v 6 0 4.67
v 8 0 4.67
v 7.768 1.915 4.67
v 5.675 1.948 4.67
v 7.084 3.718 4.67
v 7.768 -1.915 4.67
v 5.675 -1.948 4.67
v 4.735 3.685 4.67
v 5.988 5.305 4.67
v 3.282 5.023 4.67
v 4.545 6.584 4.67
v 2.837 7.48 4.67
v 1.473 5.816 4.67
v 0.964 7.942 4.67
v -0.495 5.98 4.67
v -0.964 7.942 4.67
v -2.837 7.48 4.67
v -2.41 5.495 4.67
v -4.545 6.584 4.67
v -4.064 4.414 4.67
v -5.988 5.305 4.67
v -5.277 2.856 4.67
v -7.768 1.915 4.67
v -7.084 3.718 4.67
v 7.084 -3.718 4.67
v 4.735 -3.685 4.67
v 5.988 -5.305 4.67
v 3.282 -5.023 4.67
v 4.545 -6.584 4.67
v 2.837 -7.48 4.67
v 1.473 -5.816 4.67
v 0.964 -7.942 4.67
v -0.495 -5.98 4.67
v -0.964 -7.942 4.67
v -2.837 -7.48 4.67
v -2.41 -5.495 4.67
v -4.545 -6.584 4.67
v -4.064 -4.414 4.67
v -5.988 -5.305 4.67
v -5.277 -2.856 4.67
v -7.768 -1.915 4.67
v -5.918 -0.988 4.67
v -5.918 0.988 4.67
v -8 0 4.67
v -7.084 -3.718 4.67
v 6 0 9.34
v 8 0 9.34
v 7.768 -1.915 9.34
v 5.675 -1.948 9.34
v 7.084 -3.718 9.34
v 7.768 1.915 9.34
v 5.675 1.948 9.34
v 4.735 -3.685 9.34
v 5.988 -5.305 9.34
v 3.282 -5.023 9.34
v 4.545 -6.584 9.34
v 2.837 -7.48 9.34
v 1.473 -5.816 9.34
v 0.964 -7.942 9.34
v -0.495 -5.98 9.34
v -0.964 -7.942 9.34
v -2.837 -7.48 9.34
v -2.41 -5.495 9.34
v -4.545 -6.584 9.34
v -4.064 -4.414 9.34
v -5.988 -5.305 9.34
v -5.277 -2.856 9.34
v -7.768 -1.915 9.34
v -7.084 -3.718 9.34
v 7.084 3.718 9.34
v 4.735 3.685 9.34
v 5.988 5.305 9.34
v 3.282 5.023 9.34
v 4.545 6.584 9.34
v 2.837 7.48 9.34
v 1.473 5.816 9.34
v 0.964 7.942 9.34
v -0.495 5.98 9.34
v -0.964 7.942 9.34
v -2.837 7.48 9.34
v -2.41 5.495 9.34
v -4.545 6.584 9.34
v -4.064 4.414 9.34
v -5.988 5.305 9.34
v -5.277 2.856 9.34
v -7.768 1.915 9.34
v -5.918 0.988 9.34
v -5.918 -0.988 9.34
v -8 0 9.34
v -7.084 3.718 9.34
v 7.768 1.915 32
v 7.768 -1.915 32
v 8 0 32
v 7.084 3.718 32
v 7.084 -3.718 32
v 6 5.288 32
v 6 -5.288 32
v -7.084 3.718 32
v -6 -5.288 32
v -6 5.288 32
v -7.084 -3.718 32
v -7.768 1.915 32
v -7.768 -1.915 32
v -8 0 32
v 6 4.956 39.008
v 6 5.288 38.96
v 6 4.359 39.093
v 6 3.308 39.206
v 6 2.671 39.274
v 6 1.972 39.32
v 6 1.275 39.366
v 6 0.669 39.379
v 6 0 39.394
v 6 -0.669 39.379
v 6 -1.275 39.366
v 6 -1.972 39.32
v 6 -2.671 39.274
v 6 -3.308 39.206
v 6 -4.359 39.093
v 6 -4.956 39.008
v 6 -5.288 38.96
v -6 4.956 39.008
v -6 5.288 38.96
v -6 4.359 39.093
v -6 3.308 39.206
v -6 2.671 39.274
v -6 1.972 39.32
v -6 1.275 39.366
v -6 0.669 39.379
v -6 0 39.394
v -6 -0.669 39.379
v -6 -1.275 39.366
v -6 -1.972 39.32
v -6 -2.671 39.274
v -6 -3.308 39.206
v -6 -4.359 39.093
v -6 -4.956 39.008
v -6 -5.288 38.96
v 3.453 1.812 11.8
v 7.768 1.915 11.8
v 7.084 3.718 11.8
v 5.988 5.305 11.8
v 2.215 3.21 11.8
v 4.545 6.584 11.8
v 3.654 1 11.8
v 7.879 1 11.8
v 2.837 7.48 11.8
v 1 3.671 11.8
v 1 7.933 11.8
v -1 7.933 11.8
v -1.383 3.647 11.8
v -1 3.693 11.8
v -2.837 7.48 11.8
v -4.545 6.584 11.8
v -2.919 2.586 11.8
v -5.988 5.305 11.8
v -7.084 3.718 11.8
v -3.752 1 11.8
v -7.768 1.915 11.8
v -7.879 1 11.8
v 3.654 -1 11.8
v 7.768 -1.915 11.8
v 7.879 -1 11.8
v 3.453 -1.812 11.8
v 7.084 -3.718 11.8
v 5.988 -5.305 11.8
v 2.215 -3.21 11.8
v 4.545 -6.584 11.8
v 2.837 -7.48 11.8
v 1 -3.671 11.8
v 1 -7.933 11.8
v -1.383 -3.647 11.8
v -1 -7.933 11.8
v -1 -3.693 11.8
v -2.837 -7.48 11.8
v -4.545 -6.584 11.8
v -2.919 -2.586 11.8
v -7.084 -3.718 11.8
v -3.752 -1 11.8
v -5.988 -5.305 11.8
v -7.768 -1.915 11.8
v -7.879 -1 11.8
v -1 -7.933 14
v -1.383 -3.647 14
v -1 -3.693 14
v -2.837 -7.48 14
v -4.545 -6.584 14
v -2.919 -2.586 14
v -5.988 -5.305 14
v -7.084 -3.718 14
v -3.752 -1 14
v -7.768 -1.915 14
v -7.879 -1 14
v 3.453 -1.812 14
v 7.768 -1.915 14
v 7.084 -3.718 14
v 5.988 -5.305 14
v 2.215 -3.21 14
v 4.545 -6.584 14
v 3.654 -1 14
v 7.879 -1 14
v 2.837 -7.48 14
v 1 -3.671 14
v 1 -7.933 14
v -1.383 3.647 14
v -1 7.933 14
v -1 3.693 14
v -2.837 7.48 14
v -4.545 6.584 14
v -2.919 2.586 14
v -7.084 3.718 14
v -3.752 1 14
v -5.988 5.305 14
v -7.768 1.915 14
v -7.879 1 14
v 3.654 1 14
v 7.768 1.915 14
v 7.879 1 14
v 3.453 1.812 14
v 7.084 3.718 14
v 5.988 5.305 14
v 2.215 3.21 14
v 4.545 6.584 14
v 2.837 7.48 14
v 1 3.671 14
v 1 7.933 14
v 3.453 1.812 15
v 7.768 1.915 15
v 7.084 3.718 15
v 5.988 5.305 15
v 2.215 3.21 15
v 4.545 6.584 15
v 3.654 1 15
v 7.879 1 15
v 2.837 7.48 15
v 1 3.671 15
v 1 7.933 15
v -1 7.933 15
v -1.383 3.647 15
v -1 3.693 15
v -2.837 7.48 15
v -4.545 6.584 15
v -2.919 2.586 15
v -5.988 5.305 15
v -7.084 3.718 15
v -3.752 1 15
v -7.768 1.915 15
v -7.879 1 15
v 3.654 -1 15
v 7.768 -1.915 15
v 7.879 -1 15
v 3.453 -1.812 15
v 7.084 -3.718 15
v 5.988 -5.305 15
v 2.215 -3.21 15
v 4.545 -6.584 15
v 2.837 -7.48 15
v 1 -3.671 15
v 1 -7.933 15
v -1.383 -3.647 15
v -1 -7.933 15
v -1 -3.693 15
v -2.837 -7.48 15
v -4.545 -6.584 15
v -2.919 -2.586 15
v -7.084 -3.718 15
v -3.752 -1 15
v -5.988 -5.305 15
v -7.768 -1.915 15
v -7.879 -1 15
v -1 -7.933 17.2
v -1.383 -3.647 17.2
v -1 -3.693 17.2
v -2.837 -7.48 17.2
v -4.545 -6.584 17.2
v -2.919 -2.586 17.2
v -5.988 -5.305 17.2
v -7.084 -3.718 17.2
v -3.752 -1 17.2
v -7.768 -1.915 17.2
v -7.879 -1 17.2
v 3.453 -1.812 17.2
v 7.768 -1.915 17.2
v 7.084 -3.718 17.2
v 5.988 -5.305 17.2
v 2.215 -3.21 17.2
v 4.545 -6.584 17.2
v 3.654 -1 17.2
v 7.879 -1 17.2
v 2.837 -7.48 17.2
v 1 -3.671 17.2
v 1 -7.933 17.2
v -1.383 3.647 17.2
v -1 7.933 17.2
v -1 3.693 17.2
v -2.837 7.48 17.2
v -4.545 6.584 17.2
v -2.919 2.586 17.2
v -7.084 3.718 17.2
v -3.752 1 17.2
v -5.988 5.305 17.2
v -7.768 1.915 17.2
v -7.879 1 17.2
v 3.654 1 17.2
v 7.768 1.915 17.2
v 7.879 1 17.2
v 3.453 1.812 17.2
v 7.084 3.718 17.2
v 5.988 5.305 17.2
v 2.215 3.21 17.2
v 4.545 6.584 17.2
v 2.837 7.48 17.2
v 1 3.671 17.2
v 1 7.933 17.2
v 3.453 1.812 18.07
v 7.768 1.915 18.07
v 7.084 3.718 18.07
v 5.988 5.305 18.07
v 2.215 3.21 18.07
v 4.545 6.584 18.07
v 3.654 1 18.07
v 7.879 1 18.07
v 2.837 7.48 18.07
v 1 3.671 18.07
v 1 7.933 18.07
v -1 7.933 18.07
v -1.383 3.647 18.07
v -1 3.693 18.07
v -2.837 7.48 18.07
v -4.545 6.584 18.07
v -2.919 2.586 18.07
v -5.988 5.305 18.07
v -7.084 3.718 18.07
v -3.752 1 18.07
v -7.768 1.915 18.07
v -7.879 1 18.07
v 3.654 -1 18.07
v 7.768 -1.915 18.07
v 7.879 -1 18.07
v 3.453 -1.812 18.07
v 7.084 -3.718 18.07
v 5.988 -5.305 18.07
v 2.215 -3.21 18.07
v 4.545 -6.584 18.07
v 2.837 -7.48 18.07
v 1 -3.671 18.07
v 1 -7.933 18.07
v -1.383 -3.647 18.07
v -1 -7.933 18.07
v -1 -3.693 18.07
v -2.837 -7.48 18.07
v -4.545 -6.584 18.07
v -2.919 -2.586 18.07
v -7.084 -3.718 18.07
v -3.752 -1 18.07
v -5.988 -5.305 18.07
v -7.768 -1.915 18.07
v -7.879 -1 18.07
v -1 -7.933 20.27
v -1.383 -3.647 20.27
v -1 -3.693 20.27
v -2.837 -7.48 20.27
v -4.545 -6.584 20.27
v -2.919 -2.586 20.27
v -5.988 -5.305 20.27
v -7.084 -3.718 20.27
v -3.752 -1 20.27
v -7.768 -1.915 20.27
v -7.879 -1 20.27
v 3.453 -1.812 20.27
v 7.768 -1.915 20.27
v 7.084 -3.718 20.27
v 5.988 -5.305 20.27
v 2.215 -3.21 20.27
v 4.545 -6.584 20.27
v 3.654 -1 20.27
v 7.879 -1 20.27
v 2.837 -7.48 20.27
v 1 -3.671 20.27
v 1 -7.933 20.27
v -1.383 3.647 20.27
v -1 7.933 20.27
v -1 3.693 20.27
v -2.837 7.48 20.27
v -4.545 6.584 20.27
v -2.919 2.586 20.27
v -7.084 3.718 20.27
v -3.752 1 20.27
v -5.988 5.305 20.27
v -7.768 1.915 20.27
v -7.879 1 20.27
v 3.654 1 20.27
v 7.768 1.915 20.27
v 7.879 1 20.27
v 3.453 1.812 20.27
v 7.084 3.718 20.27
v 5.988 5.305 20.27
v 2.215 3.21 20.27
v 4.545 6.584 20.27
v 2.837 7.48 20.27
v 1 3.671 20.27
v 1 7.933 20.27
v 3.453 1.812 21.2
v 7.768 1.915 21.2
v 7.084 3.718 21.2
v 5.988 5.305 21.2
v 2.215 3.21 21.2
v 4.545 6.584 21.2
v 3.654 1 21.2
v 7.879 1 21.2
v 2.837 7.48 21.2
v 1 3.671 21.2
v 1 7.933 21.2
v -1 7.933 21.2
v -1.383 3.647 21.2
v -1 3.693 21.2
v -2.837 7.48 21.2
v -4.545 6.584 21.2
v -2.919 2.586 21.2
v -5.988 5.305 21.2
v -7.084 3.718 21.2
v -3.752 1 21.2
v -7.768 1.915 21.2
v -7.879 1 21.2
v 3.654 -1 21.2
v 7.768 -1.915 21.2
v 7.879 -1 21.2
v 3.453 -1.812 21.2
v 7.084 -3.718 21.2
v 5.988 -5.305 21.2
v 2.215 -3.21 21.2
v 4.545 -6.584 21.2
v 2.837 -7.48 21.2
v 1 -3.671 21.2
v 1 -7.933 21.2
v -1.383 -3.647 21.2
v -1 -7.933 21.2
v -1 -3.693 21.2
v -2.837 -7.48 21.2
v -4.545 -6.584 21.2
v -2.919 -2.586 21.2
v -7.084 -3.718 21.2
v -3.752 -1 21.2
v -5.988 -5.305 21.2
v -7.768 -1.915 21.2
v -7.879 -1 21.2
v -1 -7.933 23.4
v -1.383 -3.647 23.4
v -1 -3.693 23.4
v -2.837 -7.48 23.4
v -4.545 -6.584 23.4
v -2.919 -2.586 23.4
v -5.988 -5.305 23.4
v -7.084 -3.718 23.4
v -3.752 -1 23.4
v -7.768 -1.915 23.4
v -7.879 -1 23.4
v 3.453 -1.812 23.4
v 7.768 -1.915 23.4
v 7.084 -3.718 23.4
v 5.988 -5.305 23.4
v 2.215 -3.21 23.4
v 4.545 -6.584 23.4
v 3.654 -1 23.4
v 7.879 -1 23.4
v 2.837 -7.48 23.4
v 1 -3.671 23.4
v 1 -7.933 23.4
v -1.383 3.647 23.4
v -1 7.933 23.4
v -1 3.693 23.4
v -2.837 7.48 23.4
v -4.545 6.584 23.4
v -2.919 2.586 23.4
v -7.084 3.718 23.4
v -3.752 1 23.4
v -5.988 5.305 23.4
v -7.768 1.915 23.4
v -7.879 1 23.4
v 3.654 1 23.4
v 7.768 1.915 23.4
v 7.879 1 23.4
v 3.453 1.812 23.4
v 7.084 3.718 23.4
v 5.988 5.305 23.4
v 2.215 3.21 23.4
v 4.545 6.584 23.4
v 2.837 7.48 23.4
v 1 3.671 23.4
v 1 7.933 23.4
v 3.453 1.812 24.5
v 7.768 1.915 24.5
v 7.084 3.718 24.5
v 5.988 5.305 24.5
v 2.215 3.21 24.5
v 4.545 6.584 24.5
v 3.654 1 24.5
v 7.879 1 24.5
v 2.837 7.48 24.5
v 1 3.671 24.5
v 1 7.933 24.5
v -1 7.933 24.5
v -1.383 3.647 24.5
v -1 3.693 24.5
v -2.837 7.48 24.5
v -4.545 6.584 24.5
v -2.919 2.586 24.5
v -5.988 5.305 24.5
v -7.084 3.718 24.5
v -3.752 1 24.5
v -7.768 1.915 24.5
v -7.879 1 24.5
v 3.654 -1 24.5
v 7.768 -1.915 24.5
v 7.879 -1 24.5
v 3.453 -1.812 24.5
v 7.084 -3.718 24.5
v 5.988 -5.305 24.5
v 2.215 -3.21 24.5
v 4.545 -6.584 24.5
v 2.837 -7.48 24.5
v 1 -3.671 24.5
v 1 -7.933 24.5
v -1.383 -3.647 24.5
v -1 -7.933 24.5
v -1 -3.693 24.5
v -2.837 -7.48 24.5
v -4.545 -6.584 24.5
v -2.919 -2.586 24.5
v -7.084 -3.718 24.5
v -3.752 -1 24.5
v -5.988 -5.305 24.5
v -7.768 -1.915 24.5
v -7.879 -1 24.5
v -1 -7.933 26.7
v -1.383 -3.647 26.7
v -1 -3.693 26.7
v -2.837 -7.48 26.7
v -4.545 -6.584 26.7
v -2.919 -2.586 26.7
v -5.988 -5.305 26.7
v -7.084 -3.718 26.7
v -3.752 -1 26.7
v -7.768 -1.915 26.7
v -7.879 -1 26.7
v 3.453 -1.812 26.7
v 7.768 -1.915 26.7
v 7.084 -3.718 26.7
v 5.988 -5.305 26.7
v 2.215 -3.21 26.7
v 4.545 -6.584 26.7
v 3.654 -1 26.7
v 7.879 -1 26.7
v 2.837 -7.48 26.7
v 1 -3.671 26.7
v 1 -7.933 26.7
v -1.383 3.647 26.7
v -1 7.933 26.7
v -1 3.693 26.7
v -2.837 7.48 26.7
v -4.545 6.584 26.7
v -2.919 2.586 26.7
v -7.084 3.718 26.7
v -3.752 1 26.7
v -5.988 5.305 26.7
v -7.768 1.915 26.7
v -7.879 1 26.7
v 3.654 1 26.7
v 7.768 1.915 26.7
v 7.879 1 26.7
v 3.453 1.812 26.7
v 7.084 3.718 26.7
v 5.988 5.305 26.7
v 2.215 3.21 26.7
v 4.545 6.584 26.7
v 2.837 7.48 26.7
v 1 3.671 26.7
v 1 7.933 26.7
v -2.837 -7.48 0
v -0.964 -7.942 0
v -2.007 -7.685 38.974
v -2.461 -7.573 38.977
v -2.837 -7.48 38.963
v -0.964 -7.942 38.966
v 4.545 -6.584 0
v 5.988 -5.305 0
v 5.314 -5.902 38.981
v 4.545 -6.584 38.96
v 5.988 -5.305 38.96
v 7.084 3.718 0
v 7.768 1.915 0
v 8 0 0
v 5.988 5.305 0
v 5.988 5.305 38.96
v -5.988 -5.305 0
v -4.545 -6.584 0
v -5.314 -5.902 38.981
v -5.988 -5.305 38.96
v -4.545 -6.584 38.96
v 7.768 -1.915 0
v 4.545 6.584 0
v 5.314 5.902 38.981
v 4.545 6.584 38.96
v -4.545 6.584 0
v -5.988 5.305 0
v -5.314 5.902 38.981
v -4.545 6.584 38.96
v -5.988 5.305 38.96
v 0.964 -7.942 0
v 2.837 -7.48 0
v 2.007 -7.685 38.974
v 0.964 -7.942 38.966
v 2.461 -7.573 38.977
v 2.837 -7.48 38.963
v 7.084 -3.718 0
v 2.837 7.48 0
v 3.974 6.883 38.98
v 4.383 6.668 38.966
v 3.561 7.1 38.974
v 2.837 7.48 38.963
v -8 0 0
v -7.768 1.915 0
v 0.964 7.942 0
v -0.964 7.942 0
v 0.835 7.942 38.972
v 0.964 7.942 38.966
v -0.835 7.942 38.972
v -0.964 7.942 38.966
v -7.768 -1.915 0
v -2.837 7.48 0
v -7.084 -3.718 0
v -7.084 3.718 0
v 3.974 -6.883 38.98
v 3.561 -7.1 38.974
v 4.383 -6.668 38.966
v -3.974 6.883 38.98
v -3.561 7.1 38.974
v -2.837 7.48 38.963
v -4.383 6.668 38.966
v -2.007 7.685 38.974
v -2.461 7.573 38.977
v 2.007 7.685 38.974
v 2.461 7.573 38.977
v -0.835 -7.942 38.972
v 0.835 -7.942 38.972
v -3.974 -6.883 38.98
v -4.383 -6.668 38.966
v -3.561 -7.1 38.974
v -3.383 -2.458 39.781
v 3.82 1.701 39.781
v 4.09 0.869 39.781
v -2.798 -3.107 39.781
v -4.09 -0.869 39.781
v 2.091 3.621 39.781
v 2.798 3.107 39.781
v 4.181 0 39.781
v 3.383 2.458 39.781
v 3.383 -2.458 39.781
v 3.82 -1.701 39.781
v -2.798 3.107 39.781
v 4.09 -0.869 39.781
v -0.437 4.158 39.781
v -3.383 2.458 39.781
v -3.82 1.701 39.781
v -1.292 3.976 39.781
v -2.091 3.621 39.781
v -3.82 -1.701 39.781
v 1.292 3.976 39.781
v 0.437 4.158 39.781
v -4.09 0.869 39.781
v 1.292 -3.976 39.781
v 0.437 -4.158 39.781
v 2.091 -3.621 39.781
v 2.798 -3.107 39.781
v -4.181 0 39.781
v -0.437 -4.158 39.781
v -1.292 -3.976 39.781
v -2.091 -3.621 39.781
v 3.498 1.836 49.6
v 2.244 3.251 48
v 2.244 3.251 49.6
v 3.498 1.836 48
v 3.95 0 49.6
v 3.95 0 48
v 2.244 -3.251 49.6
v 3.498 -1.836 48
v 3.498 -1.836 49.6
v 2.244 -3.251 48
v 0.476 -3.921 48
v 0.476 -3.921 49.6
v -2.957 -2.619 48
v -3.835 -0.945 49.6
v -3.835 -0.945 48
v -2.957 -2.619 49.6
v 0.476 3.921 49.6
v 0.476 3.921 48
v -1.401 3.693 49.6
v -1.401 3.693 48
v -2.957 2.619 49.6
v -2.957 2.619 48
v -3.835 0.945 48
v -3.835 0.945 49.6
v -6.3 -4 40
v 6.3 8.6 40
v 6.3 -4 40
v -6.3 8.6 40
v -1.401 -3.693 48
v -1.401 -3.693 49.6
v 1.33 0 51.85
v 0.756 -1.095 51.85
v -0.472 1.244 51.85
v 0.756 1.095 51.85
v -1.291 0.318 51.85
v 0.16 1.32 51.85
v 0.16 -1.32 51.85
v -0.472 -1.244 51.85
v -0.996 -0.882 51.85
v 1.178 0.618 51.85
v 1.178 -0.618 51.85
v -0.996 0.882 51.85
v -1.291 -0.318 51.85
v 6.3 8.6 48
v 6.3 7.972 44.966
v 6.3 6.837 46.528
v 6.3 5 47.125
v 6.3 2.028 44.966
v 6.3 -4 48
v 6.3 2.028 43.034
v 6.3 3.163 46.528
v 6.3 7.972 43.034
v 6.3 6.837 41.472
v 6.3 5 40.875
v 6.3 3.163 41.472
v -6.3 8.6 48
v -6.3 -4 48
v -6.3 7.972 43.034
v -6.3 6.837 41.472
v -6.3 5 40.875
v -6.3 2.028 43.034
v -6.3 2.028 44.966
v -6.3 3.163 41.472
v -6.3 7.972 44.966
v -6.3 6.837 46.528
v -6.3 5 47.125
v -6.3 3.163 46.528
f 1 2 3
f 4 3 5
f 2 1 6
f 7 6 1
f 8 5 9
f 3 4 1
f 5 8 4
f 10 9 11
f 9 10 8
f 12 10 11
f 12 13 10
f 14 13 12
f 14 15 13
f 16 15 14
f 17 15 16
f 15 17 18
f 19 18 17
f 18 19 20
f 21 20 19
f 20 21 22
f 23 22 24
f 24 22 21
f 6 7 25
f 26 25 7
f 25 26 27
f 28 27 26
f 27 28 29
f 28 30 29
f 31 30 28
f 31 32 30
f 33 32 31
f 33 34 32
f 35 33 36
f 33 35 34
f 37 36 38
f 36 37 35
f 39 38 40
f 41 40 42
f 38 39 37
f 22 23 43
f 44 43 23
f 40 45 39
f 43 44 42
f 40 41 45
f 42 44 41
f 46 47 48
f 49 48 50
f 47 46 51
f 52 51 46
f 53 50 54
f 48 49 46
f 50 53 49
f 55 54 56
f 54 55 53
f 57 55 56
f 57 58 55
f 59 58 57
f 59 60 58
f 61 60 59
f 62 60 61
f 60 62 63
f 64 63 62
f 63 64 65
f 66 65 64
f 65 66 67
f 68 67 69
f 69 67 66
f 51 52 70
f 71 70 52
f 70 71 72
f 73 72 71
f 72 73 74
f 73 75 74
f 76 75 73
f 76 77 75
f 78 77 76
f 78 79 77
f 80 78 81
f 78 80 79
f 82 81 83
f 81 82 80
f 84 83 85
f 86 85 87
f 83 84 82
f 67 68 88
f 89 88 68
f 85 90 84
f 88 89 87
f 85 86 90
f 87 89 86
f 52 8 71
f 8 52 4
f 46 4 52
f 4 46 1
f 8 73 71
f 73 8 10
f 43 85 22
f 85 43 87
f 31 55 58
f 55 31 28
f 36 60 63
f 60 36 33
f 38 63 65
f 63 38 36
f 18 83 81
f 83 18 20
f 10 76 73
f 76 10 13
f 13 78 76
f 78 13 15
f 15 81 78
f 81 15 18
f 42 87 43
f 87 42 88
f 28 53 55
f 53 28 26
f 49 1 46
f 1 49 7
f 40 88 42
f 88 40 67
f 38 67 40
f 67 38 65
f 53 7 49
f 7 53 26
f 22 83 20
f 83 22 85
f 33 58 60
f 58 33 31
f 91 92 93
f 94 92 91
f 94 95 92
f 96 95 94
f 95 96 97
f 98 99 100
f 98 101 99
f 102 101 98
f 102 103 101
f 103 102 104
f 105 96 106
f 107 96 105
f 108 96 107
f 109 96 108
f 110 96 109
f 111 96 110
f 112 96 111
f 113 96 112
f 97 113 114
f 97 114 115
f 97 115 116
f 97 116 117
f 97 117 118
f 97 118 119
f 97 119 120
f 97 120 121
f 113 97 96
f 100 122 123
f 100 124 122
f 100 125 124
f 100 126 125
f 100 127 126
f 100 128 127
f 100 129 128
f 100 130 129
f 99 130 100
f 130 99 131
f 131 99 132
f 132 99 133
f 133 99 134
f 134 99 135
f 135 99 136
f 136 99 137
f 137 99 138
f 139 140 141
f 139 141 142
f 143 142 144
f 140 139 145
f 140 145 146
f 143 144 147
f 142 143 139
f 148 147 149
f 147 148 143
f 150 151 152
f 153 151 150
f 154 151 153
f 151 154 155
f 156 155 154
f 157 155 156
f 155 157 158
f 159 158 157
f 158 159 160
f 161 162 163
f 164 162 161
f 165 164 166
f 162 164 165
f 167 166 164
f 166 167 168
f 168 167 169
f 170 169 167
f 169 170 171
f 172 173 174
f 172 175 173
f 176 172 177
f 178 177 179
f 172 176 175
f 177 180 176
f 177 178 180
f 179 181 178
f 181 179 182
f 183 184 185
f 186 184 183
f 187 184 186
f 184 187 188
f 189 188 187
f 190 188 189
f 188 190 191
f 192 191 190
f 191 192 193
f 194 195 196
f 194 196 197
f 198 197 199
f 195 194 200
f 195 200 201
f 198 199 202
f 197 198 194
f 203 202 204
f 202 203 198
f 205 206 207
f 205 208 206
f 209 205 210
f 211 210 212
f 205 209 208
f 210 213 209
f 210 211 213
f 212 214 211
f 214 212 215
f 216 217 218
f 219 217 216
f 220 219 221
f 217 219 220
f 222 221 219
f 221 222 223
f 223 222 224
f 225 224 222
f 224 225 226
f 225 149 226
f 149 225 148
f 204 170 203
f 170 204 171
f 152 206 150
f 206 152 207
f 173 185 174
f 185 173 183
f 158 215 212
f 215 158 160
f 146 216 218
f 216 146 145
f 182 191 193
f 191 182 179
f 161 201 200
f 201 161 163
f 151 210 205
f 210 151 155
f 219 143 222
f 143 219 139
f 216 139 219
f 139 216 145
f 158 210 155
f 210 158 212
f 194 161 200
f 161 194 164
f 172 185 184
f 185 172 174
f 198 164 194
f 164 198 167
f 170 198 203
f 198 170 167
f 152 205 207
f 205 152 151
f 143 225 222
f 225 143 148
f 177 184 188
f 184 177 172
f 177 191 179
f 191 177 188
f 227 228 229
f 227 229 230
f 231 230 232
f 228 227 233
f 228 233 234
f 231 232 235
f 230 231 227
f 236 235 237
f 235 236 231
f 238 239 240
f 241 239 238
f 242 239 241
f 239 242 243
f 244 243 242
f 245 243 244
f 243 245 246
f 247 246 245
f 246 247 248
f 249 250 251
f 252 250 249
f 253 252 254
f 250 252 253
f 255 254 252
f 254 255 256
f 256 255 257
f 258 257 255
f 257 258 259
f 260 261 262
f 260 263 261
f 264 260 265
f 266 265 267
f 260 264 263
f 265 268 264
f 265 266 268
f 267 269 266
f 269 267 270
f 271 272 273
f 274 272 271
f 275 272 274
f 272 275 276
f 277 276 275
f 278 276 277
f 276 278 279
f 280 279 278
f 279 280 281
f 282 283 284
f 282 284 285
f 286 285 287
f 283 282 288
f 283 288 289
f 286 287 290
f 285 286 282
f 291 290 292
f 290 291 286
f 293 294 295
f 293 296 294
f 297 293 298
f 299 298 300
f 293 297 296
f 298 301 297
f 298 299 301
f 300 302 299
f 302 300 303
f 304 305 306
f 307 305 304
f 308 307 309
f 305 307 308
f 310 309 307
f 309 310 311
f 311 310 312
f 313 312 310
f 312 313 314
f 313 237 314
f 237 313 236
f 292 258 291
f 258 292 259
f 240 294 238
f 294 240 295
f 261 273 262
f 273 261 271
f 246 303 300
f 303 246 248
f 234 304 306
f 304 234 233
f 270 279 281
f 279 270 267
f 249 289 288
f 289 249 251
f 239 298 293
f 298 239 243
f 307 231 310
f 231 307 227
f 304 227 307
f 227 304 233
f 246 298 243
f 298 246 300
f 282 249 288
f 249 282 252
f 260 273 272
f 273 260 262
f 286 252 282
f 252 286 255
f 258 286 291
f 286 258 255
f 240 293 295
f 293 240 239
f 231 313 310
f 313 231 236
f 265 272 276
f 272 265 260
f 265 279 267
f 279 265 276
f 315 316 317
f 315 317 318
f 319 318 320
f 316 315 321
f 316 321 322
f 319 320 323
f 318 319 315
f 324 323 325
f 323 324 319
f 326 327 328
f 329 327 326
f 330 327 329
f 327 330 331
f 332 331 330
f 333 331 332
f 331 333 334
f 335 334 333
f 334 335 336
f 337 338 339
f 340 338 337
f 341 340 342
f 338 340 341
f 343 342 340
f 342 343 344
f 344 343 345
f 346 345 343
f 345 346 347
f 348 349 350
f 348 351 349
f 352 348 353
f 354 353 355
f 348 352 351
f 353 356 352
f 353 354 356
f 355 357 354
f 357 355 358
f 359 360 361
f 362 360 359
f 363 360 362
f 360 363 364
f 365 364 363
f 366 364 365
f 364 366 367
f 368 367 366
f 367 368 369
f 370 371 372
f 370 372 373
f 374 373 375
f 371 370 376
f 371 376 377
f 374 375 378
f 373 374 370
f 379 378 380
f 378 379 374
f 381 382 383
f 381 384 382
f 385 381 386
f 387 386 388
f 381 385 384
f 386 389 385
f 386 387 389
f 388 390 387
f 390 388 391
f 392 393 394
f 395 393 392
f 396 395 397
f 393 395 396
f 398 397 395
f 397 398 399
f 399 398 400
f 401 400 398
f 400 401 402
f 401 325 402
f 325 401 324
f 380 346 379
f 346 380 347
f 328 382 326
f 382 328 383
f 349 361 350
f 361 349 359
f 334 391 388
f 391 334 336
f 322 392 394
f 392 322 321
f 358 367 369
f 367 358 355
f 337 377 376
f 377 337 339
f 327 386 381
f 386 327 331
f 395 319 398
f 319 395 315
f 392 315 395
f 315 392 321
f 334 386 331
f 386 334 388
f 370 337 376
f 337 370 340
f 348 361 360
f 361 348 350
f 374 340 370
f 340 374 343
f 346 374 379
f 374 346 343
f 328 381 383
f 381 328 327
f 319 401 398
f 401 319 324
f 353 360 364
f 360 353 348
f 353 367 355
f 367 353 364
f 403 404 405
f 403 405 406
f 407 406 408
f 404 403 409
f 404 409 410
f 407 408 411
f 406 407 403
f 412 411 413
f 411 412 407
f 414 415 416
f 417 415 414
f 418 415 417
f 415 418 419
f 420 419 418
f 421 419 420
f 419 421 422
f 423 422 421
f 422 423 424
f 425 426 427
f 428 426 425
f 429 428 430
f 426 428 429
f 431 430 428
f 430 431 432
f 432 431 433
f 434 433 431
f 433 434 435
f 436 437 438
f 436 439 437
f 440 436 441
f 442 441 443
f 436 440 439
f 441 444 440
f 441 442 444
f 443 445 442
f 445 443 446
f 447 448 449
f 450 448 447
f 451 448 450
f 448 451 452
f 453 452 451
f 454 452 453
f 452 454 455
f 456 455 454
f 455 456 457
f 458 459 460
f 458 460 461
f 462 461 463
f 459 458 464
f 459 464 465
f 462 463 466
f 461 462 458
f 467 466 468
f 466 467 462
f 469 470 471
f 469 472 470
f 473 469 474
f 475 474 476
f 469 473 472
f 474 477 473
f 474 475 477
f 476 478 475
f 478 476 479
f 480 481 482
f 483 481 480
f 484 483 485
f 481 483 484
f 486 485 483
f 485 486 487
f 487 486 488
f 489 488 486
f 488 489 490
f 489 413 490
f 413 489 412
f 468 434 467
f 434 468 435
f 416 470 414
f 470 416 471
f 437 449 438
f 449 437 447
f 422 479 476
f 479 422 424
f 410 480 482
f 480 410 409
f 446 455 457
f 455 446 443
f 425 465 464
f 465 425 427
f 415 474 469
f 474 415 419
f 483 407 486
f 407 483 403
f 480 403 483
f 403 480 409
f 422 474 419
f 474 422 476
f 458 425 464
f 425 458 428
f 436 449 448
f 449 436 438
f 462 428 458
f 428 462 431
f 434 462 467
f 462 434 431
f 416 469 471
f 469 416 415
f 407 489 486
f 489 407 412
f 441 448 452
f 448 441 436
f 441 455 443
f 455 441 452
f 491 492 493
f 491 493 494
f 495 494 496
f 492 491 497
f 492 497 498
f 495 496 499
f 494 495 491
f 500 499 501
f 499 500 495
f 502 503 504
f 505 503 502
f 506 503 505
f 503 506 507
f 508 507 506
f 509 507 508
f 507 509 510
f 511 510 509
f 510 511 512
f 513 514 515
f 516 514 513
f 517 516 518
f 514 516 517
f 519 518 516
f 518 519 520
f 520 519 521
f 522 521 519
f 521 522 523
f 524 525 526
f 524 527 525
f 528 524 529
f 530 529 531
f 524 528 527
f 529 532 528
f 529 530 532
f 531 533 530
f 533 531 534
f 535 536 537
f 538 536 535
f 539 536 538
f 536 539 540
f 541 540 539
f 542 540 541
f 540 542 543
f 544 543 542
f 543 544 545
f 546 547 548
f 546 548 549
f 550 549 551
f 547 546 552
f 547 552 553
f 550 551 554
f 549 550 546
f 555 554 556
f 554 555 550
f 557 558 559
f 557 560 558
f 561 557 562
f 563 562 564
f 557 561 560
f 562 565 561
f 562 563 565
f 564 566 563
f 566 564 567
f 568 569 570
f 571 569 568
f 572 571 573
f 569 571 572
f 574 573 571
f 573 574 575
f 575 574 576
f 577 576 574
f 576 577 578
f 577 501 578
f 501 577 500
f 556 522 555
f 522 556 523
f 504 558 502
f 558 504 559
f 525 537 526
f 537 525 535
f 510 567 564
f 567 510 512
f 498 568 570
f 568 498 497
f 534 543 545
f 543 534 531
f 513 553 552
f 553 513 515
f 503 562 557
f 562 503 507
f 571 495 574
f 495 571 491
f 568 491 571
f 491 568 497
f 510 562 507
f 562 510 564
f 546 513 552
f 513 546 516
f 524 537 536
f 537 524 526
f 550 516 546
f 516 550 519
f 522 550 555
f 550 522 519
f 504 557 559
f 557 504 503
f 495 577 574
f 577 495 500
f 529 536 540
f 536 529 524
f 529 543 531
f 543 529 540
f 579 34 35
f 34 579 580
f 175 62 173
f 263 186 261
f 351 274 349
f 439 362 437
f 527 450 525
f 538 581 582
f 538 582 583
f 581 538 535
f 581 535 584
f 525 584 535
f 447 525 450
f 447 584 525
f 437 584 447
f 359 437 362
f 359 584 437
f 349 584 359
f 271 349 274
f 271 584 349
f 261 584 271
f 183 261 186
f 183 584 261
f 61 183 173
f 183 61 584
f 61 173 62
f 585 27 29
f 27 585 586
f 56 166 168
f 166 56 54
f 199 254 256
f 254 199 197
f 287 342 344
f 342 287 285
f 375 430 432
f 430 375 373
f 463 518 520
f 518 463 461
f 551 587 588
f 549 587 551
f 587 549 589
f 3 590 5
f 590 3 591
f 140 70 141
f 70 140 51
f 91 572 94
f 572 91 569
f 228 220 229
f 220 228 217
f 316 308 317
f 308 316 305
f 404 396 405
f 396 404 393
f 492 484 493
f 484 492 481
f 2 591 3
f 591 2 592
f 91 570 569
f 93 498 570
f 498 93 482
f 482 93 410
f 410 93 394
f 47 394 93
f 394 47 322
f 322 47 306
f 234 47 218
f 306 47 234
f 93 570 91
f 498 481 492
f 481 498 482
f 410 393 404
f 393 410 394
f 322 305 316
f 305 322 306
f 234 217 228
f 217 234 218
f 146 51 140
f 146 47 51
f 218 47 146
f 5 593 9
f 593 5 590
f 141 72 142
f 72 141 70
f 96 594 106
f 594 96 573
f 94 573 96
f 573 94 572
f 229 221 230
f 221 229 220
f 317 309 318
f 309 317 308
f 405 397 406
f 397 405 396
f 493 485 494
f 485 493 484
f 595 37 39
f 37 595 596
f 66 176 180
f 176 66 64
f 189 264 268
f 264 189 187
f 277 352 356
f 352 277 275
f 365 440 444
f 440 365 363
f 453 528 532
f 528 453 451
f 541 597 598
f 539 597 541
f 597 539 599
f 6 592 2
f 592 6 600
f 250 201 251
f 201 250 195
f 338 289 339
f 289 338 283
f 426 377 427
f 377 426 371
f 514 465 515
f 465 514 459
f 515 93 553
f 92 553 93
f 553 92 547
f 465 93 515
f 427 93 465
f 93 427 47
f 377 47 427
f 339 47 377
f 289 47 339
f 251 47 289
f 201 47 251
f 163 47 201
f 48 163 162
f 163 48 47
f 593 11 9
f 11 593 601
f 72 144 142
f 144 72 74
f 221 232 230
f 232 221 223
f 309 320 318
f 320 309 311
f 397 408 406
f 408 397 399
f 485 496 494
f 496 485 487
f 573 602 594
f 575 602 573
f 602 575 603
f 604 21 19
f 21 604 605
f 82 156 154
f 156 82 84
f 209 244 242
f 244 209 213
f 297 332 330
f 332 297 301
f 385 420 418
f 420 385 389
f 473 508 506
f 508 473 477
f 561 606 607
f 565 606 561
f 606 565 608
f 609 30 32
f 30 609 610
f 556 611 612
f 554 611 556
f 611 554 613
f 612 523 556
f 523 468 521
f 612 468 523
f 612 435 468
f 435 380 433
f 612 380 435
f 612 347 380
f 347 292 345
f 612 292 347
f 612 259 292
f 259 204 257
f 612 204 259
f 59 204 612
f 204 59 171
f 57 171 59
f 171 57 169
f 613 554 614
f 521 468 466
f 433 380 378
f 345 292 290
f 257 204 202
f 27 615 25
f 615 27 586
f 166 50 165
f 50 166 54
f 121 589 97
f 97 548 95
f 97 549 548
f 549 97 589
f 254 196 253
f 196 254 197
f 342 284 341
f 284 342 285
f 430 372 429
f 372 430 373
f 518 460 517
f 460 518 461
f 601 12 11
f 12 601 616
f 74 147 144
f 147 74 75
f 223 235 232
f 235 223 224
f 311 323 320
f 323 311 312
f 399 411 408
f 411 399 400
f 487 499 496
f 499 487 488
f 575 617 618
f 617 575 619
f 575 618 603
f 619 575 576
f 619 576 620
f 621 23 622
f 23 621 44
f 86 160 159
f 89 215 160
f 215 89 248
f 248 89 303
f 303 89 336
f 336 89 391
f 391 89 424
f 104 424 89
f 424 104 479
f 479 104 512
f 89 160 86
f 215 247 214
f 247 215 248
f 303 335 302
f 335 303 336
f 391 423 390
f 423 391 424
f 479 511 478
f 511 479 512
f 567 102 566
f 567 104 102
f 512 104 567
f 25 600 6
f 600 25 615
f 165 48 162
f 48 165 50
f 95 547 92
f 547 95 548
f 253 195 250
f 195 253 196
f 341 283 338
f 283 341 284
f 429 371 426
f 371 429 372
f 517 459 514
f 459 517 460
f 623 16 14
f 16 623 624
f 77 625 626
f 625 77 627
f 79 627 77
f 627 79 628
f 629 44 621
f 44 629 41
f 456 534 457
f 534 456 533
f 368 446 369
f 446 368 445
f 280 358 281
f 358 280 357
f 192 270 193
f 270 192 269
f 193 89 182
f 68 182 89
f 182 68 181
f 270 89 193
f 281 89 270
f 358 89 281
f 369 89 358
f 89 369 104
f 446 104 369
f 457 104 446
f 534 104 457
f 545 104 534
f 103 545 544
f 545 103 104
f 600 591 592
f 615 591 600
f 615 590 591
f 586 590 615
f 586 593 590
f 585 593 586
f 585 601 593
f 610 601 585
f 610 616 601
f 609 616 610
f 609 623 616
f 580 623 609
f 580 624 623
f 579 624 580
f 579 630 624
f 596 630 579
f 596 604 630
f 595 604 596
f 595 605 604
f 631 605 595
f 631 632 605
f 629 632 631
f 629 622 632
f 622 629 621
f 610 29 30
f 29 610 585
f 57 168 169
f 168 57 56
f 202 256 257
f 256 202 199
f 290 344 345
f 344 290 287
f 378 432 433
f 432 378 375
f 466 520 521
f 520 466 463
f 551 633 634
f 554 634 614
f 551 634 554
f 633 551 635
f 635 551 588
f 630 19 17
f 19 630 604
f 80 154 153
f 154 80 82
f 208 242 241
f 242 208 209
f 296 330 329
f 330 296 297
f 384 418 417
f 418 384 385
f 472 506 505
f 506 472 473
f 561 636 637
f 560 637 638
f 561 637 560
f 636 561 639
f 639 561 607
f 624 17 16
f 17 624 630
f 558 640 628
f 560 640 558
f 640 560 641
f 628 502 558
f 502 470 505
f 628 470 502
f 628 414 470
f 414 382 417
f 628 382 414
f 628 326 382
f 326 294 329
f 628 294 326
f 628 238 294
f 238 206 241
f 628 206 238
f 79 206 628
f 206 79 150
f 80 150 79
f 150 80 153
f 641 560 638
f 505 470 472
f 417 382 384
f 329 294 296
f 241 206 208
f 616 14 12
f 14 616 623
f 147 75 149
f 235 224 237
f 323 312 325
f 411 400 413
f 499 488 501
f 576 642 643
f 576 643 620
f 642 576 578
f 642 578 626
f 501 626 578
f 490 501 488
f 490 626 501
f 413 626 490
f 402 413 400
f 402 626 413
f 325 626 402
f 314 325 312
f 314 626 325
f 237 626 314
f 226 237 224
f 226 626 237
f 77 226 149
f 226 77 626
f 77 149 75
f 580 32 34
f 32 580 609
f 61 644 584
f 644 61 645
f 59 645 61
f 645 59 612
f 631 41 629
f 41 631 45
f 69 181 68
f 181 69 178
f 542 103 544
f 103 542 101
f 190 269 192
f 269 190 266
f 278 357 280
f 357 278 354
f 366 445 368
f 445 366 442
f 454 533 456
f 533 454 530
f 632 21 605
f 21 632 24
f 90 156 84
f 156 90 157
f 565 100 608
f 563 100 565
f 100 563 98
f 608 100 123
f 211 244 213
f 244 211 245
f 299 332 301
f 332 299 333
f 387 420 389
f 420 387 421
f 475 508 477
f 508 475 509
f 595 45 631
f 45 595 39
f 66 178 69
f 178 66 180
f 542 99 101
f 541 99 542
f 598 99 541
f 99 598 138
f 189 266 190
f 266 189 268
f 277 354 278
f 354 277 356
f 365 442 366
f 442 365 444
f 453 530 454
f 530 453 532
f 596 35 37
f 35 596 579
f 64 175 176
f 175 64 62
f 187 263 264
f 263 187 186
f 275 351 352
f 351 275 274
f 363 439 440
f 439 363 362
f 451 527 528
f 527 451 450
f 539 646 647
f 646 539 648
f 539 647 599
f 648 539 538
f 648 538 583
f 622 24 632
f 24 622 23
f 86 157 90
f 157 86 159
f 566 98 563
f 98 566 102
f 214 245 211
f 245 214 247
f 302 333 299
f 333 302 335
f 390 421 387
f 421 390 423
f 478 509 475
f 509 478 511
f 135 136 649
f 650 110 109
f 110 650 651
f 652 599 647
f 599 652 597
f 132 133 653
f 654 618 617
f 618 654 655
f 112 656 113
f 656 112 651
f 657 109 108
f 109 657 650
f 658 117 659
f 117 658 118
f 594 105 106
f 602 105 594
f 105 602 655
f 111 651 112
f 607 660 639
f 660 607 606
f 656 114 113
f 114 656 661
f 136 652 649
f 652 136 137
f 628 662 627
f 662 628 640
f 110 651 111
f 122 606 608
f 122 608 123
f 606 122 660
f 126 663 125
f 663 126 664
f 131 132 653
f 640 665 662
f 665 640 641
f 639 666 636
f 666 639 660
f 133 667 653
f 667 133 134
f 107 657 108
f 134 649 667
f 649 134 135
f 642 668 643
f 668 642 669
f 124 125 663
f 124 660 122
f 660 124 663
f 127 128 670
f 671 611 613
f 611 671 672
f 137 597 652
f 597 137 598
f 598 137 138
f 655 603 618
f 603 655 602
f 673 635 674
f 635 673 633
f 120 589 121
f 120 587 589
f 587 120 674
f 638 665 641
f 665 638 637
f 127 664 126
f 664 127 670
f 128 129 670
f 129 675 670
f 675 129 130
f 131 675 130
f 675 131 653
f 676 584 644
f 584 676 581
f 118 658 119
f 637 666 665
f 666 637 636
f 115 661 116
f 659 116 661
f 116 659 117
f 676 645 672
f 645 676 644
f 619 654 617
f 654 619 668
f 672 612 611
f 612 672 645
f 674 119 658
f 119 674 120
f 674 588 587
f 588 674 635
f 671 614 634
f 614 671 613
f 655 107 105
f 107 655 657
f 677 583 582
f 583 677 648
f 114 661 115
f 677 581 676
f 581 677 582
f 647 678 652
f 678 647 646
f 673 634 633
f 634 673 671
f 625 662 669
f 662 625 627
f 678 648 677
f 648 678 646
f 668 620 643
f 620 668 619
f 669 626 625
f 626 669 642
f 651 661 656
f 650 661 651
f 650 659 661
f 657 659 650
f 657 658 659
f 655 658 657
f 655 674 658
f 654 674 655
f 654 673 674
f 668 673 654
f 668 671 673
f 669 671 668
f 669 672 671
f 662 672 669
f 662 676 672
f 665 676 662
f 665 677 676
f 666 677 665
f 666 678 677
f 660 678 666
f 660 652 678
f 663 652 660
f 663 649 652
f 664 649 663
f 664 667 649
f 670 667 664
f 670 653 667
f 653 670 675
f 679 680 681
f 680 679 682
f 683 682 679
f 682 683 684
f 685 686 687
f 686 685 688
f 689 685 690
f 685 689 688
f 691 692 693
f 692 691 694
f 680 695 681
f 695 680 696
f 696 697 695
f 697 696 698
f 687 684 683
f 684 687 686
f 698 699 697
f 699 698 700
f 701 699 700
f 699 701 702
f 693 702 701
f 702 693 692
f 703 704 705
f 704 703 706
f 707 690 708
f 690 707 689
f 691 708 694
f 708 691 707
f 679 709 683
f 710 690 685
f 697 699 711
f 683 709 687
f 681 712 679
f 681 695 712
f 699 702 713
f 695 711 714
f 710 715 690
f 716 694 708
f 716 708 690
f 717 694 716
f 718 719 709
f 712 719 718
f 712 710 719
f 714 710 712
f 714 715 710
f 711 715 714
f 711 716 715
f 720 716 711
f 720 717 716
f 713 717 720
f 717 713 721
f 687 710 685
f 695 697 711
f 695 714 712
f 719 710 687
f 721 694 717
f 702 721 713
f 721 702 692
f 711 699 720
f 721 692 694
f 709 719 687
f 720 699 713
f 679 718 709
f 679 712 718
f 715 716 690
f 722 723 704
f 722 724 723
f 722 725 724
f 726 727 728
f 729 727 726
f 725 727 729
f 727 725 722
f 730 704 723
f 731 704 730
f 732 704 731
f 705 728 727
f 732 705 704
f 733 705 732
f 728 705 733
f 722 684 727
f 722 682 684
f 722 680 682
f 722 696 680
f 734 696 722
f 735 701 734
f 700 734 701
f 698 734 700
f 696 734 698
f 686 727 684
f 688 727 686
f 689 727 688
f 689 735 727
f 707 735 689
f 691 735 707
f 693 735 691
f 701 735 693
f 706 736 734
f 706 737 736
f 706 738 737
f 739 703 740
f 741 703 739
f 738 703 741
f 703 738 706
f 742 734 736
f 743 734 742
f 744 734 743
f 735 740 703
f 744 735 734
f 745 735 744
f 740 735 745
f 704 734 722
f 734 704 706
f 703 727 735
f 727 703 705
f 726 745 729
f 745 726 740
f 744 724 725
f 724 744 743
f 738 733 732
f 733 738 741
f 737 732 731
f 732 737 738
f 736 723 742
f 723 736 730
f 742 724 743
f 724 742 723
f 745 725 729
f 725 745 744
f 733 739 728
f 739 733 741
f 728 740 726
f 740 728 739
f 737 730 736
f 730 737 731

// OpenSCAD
hotend_jhead();

module hotend_jhead() {
	translate([0,0,0])  jhead_plastic_body();
	translate([0,0,40]) jhead_brass_nozzle();
}

module jhead_plastic_body() {
	intersection() {
	difference() {
		cylinder(h=40,r=8);
		translate([0,0,4.67]) jhead_groovemount_cutout();
	
		// add the wrench flats
		translate([0,0,32]) jhead_wrench_cutout();
		
		// add (crappy) cooling grooves
		translate([0,0,11.80]) jhead_cooling_cutout();
		translate([0,0,15.00]) jhead_cooling_cutout();
		translate([0,0,18.07]) jhead_cooling_cutout();
		translate([0,0,21.20]) jhead_cooling_cutout();
		translate([0,0,24.50]) jhead_cooling_cutout();
	}
	// get the rounded bit at the end
	sphere(r=40);
	}
}

module jhead_groovemount_cutout() {
	difference() {
		cylinder(h=4.67,r=10);
		cylinder(h=4.67,r=6);
	}
}

module jhead_wrench_cutout() {
	difference() {
		translate([-10,-10,0]) cube([20,20,8]);
		translate([-6,-10,0])  cube([12,20,8]);
	}
}

module jhead_cooling_cutout() {
	render() difference() {
		difference() {
			cylinder(h=2.20,r=10);		
			translate([-1,-10,0]) cube([2,20,2.2]);
			translate([-10,-1,0]) cube([20,2,2.2]);
		}
		cylinder(h=2.20,r=3.9);
	}
}

module jhead_brass_nozzle() { 
	// heater body 12.65 x 12.65 x 8
	//
	//
	difference() {
	union() {
	// draw the cylinder and cap it with the nozzle
	translate([0,0,0])     cylinder(h=9.60, r=3.95);
	translate([0,0,9.6])   cylinder(h=2.25, r1=3.95, r2=1.33);
	translate([-6.3,-4,0]) cube([12.6,12.6,8]);
	}
	translate([6.4,5,4]) rotate([0,270,0]) cylinder(h=12.8,r=3.125);
	}
}
